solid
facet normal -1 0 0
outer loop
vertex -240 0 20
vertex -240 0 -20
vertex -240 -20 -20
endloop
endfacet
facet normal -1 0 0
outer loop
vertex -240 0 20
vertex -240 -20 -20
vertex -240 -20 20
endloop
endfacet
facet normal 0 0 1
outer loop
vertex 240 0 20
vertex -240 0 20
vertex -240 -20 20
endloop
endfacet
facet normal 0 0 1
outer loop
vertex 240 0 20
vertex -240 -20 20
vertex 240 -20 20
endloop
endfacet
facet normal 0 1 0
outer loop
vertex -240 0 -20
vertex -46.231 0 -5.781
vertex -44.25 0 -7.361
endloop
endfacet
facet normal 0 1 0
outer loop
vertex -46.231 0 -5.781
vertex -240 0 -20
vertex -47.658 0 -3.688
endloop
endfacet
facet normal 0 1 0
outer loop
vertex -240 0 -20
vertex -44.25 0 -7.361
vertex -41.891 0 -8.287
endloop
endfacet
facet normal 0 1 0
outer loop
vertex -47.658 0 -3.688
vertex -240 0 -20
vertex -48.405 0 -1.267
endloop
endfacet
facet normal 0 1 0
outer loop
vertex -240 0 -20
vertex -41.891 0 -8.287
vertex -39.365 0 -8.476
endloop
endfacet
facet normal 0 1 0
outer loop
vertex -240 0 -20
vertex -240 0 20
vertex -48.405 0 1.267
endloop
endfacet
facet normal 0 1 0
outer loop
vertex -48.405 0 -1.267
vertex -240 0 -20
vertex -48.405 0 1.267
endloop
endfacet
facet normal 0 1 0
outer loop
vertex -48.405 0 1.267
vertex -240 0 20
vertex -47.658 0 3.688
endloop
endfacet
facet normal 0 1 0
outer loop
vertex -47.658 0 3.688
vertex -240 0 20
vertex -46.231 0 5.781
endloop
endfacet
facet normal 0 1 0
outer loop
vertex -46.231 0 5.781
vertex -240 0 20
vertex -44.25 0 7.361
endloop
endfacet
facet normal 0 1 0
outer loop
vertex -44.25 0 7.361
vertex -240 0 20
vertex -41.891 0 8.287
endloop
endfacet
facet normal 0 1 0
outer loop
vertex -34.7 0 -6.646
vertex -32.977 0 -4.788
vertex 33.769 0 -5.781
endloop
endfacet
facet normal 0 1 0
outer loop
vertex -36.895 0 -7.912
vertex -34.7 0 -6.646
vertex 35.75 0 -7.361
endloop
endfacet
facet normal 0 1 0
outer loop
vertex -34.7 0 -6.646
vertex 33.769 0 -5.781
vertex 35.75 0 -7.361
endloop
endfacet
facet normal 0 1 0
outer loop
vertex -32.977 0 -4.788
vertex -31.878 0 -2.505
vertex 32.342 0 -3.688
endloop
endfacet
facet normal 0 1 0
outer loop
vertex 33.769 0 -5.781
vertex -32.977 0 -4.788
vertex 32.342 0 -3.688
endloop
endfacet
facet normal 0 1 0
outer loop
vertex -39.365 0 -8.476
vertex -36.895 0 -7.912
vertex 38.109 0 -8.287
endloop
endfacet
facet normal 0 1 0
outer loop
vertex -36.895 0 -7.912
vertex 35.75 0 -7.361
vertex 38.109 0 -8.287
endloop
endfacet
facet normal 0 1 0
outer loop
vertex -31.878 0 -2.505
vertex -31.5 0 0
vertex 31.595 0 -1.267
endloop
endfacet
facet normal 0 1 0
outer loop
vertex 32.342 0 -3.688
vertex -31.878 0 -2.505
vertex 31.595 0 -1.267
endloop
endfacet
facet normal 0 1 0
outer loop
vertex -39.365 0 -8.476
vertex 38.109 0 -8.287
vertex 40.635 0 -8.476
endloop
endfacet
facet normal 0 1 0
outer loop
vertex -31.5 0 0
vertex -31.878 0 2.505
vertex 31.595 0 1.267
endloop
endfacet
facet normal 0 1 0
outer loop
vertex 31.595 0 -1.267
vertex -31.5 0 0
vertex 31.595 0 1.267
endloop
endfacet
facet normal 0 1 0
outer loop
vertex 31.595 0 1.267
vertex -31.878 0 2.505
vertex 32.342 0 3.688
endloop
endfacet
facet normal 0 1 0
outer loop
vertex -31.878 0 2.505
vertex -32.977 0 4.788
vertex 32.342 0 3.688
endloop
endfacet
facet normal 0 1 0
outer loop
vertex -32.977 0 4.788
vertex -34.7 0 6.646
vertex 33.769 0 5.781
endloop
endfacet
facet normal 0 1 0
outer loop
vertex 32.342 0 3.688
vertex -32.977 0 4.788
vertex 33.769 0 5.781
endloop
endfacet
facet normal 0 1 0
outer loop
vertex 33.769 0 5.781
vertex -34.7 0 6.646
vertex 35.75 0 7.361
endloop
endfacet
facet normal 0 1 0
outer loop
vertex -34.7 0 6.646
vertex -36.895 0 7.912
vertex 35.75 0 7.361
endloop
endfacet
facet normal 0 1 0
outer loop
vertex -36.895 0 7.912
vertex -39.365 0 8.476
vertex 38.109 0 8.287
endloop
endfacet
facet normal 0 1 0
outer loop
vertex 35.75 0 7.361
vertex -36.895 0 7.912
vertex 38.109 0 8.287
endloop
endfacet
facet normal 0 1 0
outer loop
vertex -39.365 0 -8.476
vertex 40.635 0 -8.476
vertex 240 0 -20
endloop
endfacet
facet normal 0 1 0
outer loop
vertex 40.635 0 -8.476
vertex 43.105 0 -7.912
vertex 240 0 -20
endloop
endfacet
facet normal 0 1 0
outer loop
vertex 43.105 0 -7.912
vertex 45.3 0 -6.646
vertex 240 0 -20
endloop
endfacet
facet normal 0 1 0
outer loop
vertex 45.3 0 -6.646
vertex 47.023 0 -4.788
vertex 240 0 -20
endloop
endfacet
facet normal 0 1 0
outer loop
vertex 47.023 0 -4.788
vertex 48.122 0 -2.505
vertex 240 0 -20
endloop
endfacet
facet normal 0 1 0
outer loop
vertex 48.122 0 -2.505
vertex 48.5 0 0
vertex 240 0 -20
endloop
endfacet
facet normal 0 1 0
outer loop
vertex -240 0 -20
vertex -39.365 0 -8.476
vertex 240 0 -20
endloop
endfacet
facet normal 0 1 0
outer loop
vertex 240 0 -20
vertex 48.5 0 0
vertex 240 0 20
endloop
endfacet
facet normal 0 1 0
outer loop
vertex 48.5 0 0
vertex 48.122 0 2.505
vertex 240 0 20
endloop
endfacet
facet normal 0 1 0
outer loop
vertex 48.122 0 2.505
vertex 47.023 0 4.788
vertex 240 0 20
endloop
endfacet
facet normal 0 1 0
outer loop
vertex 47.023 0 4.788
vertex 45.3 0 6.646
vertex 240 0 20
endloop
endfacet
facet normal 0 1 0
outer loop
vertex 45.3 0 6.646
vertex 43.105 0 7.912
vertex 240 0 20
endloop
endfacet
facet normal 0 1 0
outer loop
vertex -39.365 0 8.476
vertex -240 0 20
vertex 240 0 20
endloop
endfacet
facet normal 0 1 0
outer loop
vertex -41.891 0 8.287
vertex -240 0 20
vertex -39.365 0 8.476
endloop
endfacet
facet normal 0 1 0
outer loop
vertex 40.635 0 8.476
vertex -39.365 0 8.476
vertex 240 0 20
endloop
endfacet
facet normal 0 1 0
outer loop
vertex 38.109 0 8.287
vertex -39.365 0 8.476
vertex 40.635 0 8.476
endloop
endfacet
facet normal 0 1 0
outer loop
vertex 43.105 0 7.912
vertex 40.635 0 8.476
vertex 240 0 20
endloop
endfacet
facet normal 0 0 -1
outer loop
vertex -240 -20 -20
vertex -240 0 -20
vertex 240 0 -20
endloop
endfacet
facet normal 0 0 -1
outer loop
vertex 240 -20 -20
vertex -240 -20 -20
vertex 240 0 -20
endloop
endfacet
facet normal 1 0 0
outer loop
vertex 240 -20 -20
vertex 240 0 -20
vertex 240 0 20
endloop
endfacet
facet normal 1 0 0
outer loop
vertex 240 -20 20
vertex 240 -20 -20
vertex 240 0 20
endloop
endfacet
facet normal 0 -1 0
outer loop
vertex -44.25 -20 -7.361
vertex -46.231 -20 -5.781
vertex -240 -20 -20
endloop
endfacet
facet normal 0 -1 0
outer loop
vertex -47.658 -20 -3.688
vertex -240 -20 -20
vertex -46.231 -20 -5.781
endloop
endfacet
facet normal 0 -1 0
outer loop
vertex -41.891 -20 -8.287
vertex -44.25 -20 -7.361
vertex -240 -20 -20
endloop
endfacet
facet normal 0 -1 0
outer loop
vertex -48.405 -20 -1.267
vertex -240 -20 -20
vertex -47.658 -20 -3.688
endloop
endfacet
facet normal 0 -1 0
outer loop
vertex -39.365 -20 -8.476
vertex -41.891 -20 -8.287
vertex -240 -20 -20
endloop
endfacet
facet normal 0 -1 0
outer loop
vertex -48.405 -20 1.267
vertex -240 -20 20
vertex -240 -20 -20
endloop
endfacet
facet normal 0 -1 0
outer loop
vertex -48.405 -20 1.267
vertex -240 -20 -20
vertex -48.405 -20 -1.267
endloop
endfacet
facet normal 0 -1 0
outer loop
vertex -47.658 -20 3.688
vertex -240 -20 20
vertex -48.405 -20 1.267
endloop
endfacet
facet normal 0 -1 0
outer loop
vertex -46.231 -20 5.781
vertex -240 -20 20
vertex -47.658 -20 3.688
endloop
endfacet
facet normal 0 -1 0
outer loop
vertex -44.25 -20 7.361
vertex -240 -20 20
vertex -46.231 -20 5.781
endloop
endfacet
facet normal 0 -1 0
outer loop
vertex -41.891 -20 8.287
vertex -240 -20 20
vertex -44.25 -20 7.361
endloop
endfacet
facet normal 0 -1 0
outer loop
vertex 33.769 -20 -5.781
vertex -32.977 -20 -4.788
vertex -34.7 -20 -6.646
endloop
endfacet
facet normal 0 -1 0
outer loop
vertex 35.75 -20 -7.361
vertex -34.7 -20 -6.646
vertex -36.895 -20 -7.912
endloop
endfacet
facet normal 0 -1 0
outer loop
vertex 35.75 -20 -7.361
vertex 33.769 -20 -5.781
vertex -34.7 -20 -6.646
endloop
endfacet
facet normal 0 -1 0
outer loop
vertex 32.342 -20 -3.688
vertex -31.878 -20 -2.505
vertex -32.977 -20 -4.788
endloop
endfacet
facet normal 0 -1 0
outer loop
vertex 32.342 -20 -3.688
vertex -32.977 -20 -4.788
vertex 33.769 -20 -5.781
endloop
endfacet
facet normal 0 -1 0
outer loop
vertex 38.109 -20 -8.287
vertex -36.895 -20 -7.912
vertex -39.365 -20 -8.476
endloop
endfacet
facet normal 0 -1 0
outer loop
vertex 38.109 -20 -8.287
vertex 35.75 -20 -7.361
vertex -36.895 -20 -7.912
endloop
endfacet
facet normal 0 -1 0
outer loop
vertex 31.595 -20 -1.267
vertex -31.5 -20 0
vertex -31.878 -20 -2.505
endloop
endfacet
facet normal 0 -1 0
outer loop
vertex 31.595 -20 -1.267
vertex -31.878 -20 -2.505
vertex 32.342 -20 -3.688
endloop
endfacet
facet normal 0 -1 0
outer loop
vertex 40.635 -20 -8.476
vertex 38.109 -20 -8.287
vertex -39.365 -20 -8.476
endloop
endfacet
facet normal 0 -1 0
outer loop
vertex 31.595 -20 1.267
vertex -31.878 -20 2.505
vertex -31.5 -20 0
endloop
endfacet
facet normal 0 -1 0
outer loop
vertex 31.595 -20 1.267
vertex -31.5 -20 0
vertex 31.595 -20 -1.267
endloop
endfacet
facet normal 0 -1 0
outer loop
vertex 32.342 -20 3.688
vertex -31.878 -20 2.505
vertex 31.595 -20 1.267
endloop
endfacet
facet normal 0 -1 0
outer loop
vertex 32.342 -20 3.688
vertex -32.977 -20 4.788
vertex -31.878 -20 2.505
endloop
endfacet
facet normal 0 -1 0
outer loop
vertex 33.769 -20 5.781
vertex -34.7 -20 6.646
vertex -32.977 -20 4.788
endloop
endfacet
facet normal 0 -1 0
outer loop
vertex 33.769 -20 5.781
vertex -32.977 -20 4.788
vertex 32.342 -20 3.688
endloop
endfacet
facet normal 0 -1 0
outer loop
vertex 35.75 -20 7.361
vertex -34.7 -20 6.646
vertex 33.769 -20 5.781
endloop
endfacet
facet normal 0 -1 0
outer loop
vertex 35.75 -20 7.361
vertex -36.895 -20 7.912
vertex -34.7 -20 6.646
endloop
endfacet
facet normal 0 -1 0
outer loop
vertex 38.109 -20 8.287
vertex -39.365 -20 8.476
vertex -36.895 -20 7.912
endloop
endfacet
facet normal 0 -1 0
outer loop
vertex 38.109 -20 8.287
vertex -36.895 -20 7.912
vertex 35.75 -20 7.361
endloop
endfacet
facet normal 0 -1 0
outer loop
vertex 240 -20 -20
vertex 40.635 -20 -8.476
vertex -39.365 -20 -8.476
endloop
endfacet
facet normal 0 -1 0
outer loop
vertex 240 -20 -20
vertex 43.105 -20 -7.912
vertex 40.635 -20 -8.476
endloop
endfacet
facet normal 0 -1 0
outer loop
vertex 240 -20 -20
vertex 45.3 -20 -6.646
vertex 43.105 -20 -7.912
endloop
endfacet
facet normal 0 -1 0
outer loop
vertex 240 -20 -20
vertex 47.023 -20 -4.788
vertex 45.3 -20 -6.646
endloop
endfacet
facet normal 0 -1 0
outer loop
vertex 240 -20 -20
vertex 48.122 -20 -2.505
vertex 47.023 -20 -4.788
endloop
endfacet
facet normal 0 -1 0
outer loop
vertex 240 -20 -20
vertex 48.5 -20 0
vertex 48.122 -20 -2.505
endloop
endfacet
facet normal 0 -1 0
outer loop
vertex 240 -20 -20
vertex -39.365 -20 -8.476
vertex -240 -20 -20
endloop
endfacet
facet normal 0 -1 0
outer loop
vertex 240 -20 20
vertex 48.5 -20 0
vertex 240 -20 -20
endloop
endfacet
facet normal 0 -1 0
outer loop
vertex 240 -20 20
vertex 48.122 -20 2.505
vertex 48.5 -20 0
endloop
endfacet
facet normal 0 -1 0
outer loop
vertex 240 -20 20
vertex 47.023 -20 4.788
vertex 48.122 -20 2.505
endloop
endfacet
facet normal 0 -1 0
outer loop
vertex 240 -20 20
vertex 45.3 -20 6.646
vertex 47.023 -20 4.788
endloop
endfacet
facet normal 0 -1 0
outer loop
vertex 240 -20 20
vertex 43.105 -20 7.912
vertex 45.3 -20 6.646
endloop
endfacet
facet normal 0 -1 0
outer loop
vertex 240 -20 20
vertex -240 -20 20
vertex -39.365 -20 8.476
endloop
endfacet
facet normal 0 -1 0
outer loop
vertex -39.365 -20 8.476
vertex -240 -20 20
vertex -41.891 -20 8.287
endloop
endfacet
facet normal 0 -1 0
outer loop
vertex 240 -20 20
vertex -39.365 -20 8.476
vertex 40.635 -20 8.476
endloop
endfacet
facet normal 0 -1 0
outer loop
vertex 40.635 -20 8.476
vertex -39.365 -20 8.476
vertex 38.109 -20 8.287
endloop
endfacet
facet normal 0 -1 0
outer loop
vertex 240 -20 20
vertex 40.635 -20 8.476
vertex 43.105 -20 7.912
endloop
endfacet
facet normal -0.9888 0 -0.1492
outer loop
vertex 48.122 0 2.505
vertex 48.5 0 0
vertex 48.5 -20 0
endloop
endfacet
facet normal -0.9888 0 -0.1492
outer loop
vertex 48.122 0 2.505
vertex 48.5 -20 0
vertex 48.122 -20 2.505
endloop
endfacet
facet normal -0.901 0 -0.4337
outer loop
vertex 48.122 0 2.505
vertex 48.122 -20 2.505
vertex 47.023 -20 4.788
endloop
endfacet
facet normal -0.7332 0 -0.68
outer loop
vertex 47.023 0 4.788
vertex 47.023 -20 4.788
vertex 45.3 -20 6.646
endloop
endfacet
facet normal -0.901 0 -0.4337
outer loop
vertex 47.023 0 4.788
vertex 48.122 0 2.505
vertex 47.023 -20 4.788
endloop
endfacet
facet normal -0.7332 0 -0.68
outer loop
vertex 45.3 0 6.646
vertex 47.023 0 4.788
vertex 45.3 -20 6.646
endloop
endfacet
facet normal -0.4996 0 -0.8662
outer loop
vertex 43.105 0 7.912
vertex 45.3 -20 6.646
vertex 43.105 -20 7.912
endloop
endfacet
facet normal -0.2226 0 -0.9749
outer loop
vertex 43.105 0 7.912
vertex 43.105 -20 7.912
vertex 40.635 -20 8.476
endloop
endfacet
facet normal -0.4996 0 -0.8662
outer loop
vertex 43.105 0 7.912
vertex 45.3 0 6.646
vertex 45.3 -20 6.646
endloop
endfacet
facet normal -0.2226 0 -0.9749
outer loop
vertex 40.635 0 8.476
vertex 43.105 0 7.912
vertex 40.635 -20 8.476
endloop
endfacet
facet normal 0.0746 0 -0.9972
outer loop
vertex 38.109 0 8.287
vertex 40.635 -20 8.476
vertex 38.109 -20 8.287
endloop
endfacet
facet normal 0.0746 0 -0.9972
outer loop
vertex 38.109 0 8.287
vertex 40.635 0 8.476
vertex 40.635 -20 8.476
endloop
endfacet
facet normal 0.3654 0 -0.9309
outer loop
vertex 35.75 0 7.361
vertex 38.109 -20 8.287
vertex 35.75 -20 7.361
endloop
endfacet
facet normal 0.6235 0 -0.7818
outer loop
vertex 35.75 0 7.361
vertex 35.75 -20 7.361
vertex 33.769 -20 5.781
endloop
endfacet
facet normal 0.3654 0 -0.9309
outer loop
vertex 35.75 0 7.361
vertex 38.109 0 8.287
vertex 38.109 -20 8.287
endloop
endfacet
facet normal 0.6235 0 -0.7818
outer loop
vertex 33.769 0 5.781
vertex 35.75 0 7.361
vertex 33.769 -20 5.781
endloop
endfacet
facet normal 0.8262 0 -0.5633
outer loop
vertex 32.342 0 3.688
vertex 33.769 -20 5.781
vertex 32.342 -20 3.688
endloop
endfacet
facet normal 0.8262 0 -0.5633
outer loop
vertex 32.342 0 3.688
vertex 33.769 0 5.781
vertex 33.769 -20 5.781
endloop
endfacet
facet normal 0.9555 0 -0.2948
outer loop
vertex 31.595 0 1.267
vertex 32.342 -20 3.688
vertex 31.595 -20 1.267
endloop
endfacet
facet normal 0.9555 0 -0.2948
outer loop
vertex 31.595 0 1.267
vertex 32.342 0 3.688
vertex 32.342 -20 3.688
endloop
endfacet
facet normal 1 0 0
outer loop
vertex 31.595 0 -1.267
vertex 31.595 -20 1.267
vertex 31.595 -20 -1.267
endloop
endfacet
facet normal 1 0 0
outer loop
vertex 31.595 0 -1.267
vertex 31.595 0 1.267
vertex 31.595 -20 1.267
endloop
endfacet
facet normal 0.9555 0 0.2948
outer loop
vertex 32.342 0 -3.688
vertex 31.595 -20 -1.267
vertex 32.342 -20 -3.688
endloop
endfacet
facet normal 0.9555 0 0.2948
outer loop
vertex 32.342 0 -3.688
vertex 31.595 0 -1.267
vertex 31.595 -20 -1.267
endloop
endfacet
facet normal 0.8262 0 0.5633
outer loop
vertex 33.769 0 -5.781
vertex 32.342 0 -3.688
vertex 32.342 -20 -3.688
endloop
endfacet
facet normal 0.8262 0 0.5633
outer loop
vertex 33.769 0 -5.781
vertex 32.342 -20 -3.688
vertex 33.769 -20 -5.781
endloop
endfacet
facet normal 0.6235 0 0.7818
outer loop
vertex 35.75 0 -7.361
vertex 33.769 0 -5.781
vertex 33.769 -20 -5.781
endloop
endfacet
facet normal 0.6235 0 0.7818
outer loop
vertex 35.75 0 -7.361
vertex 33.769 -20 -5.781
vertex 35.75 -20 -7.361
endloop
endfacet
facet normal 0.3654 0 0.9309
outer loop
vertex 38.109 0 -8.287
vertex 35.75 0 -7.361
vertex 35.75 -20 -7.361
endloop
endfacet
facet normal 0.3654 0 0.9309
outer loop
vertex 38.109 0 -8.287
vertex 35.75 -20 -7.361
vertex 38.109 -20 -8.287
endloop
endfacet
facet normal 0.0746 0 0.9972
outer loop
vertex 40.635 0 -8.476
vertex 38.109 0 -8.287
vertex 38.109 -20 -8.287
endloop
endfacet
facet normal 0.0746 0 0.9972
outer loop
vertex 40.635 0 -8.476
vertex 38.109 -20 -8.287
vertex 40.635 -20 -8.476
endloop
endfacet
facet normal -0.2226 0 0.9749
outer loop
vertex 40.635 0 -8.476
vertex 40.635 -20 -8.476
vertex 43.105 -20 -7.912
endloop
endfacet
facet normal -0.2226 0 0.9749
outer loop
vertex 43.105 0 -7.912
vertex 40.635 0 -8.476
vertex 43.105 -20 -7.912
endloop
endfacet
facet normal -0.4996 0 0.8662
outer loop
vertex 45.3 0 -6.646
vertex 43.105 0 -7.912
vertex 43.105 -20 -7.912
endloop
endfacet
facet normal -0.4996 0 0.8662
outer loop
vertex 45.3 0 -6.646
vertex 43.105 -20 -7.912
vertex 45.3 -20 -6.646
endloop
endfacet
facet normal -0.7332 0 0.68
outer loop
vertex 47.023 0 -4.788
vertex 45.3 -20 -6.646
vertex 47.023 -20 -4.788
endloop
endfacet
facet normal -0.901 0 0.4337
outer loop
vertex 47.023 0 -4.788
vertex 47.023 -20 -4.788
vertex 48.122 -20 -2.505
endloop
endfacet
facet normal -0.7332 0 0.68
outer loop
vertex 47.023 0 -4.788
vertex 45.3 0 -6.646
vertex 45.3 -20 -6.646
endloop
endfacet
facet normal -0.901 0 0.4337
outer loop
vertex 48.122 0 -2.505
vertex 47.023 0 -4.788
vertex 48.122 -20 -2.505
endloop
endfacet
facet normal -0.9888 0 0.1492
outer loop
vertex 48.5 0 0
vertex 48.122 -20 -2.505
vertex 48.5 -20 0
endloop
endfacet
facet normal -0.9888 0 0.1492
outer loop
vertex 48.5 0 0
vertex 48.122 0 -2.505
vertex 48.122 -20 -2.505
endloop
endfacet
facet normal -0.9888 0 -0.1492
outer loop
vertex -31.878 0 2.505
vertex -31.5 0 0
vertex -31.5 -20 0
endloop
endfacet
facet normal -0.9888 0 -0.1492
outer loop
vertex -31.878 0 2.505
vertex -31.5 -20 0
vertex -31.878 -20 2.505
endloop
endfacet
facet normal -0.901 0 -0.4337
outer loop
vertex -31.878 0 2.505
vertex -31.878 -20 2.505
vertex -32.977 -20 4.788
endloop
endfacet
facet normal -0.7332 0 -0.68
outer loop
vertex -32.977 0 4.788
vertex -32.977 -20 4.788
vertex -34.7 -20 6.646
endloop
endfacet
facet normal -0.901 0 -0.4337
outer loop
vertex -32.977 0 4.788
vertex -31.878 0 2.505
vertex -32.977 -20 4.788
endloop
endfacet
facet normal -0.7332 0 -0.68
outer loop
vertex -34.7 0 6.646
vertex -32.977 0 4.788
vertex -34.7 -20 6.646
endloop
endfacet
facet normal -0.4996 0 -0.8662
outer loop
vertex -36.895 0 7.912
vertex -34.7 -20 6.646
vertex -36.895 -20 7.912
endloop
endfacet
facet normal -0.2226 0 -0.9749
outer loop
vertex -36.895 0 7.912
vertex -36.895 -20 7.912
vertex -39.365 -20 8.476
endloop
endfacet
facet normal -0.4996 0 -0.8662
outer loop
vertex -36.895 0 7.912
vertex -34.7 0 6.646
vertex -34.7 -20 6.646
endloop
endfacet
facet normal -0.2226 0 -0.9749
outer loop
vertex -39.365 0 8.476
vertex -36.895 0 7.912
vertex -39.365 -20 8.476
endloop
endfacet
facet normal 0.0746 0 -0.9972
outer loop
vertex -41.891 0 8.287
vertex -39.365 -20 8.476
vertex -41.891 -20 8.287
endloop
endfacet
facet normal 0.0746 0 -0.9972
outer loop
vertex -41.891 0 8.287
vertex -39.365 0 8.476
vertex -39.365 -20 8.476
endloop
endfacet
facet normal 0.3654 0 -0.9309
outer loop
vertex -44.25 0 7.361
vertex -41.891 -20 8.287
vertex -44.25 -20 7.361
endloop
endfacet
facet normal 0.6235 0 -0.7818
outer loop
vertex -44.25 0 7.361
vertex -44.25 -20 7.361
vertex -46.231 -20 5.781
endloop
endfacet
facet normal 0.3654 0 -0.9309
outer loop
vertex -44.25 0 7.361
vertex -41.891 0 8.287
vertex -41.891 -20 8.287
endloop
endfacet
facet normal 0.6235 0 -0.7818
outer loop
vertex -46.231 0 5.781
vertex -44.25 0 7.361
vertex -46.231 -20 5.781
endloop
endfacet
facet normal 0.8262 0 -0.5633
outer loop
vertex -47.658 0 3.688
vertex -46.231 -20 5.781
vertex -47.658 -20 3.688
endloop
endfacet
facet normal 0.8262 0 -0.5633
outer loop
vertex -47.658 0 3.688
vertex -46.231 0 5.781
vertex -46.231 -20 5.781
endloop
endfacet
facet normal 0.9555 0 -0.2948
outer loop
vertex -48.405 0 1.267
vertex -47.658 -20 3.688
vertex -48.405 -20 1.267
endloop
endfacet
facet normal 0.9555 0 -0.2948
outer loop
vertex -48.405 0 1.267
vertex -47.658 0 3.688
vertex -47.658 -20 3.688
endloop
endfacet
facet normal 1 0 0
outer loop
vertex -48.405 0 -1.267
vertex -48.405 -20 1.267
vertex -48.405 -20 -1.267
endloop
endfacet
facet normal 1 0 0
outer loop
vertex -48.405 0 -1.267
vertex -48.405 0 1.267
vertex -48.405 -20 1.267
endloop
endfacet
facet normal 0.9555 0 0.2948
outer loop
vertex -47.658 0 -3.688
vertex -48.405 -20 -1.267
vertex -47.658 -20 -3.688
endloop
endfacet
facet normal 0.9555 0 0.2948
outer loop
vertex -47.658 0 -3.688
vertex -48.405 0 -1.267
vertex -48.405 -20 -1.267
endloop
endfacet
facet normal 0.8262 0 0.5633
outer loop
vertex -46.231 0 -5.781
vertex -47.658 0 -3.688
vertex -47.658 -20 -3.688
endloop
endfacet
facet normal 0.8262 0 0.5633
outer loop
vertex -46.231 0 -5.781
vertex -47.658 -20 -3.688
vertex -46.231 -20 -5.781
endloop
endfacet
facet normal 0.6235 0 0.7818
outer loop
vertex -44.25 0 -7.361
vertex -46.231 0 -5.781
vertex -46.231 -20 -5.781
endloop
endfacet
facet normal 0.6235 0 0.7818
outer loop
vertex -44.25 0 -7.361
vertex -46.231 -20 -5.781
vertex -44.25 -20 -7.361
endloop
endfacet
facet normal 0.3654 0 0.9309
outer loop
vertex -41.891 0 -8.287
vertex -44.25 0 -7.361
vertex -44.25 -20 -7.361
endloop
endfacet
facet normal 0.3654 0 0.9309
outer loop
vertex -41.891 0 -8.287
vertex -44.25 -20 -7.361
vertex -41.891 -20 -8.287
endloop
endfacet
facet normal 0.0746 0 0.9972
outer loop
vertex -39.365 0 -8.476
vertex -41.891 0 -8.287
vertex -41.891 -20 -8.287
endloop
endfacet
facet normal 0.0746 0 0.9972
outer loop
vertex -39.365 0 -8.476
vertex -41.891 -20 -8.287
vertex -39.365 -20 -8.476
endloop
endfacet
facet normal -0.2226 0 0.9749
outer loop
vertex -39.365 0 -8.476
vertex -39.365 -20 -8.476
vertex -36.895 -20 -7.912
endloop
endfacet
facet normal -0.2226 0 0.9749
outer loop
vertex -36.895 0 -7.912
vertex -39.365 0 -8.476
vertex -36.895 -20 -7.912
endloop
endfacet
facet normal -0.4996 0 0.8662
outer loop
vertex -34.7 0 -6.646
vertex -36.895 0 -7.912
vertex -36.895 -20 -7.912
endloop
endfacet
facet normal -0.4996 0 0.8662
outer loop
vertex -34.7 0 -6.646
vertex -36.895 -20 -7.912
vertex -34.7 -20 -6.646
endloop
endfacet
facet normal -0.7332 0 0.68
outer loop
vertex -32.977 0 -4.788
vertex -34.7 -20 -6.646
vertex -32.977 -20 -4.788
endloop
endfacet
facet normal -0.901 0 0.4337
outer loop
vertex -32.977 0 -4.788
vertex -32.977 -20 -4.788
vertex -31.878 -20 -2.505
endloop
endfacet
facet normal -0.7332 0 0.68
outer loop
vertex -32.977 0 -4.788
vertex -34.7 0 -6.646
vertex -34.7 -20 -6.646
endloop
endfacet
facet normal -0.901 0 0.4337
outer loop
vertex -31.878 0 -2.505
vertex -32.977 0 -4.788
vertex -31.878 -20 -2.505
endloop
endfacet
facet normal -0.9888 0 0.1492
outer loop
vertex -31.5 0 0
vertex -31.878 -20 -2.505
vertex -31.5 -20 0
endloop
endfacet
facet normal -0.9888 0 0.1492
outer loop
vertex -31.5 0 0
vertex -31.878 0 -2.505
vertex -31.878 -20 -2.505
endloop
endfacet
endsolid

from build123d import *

# Parameters (mm, degrees)
SKETCH_W  = 480
SKETCH_H  = 40
SKETCH_R  = 8.5
PAD_DEPTH = 20


with BuildPart() as part:
    # Sketch → Pad (new body)
    with BuildSketch(Plane.XZ):
        Rectangle(SKETCH_W, SKETCH_H)
        with Locations((-40, 0)):
            Circle(SKETCH_R, mode=Mode.SUBTRACT)
        with Locations((40, 0)):
            Circle(SKETCH_R, mode=Mode.SUBTRACT)
    extrude(amount=PAD_DEPTH)


solid = part.part
